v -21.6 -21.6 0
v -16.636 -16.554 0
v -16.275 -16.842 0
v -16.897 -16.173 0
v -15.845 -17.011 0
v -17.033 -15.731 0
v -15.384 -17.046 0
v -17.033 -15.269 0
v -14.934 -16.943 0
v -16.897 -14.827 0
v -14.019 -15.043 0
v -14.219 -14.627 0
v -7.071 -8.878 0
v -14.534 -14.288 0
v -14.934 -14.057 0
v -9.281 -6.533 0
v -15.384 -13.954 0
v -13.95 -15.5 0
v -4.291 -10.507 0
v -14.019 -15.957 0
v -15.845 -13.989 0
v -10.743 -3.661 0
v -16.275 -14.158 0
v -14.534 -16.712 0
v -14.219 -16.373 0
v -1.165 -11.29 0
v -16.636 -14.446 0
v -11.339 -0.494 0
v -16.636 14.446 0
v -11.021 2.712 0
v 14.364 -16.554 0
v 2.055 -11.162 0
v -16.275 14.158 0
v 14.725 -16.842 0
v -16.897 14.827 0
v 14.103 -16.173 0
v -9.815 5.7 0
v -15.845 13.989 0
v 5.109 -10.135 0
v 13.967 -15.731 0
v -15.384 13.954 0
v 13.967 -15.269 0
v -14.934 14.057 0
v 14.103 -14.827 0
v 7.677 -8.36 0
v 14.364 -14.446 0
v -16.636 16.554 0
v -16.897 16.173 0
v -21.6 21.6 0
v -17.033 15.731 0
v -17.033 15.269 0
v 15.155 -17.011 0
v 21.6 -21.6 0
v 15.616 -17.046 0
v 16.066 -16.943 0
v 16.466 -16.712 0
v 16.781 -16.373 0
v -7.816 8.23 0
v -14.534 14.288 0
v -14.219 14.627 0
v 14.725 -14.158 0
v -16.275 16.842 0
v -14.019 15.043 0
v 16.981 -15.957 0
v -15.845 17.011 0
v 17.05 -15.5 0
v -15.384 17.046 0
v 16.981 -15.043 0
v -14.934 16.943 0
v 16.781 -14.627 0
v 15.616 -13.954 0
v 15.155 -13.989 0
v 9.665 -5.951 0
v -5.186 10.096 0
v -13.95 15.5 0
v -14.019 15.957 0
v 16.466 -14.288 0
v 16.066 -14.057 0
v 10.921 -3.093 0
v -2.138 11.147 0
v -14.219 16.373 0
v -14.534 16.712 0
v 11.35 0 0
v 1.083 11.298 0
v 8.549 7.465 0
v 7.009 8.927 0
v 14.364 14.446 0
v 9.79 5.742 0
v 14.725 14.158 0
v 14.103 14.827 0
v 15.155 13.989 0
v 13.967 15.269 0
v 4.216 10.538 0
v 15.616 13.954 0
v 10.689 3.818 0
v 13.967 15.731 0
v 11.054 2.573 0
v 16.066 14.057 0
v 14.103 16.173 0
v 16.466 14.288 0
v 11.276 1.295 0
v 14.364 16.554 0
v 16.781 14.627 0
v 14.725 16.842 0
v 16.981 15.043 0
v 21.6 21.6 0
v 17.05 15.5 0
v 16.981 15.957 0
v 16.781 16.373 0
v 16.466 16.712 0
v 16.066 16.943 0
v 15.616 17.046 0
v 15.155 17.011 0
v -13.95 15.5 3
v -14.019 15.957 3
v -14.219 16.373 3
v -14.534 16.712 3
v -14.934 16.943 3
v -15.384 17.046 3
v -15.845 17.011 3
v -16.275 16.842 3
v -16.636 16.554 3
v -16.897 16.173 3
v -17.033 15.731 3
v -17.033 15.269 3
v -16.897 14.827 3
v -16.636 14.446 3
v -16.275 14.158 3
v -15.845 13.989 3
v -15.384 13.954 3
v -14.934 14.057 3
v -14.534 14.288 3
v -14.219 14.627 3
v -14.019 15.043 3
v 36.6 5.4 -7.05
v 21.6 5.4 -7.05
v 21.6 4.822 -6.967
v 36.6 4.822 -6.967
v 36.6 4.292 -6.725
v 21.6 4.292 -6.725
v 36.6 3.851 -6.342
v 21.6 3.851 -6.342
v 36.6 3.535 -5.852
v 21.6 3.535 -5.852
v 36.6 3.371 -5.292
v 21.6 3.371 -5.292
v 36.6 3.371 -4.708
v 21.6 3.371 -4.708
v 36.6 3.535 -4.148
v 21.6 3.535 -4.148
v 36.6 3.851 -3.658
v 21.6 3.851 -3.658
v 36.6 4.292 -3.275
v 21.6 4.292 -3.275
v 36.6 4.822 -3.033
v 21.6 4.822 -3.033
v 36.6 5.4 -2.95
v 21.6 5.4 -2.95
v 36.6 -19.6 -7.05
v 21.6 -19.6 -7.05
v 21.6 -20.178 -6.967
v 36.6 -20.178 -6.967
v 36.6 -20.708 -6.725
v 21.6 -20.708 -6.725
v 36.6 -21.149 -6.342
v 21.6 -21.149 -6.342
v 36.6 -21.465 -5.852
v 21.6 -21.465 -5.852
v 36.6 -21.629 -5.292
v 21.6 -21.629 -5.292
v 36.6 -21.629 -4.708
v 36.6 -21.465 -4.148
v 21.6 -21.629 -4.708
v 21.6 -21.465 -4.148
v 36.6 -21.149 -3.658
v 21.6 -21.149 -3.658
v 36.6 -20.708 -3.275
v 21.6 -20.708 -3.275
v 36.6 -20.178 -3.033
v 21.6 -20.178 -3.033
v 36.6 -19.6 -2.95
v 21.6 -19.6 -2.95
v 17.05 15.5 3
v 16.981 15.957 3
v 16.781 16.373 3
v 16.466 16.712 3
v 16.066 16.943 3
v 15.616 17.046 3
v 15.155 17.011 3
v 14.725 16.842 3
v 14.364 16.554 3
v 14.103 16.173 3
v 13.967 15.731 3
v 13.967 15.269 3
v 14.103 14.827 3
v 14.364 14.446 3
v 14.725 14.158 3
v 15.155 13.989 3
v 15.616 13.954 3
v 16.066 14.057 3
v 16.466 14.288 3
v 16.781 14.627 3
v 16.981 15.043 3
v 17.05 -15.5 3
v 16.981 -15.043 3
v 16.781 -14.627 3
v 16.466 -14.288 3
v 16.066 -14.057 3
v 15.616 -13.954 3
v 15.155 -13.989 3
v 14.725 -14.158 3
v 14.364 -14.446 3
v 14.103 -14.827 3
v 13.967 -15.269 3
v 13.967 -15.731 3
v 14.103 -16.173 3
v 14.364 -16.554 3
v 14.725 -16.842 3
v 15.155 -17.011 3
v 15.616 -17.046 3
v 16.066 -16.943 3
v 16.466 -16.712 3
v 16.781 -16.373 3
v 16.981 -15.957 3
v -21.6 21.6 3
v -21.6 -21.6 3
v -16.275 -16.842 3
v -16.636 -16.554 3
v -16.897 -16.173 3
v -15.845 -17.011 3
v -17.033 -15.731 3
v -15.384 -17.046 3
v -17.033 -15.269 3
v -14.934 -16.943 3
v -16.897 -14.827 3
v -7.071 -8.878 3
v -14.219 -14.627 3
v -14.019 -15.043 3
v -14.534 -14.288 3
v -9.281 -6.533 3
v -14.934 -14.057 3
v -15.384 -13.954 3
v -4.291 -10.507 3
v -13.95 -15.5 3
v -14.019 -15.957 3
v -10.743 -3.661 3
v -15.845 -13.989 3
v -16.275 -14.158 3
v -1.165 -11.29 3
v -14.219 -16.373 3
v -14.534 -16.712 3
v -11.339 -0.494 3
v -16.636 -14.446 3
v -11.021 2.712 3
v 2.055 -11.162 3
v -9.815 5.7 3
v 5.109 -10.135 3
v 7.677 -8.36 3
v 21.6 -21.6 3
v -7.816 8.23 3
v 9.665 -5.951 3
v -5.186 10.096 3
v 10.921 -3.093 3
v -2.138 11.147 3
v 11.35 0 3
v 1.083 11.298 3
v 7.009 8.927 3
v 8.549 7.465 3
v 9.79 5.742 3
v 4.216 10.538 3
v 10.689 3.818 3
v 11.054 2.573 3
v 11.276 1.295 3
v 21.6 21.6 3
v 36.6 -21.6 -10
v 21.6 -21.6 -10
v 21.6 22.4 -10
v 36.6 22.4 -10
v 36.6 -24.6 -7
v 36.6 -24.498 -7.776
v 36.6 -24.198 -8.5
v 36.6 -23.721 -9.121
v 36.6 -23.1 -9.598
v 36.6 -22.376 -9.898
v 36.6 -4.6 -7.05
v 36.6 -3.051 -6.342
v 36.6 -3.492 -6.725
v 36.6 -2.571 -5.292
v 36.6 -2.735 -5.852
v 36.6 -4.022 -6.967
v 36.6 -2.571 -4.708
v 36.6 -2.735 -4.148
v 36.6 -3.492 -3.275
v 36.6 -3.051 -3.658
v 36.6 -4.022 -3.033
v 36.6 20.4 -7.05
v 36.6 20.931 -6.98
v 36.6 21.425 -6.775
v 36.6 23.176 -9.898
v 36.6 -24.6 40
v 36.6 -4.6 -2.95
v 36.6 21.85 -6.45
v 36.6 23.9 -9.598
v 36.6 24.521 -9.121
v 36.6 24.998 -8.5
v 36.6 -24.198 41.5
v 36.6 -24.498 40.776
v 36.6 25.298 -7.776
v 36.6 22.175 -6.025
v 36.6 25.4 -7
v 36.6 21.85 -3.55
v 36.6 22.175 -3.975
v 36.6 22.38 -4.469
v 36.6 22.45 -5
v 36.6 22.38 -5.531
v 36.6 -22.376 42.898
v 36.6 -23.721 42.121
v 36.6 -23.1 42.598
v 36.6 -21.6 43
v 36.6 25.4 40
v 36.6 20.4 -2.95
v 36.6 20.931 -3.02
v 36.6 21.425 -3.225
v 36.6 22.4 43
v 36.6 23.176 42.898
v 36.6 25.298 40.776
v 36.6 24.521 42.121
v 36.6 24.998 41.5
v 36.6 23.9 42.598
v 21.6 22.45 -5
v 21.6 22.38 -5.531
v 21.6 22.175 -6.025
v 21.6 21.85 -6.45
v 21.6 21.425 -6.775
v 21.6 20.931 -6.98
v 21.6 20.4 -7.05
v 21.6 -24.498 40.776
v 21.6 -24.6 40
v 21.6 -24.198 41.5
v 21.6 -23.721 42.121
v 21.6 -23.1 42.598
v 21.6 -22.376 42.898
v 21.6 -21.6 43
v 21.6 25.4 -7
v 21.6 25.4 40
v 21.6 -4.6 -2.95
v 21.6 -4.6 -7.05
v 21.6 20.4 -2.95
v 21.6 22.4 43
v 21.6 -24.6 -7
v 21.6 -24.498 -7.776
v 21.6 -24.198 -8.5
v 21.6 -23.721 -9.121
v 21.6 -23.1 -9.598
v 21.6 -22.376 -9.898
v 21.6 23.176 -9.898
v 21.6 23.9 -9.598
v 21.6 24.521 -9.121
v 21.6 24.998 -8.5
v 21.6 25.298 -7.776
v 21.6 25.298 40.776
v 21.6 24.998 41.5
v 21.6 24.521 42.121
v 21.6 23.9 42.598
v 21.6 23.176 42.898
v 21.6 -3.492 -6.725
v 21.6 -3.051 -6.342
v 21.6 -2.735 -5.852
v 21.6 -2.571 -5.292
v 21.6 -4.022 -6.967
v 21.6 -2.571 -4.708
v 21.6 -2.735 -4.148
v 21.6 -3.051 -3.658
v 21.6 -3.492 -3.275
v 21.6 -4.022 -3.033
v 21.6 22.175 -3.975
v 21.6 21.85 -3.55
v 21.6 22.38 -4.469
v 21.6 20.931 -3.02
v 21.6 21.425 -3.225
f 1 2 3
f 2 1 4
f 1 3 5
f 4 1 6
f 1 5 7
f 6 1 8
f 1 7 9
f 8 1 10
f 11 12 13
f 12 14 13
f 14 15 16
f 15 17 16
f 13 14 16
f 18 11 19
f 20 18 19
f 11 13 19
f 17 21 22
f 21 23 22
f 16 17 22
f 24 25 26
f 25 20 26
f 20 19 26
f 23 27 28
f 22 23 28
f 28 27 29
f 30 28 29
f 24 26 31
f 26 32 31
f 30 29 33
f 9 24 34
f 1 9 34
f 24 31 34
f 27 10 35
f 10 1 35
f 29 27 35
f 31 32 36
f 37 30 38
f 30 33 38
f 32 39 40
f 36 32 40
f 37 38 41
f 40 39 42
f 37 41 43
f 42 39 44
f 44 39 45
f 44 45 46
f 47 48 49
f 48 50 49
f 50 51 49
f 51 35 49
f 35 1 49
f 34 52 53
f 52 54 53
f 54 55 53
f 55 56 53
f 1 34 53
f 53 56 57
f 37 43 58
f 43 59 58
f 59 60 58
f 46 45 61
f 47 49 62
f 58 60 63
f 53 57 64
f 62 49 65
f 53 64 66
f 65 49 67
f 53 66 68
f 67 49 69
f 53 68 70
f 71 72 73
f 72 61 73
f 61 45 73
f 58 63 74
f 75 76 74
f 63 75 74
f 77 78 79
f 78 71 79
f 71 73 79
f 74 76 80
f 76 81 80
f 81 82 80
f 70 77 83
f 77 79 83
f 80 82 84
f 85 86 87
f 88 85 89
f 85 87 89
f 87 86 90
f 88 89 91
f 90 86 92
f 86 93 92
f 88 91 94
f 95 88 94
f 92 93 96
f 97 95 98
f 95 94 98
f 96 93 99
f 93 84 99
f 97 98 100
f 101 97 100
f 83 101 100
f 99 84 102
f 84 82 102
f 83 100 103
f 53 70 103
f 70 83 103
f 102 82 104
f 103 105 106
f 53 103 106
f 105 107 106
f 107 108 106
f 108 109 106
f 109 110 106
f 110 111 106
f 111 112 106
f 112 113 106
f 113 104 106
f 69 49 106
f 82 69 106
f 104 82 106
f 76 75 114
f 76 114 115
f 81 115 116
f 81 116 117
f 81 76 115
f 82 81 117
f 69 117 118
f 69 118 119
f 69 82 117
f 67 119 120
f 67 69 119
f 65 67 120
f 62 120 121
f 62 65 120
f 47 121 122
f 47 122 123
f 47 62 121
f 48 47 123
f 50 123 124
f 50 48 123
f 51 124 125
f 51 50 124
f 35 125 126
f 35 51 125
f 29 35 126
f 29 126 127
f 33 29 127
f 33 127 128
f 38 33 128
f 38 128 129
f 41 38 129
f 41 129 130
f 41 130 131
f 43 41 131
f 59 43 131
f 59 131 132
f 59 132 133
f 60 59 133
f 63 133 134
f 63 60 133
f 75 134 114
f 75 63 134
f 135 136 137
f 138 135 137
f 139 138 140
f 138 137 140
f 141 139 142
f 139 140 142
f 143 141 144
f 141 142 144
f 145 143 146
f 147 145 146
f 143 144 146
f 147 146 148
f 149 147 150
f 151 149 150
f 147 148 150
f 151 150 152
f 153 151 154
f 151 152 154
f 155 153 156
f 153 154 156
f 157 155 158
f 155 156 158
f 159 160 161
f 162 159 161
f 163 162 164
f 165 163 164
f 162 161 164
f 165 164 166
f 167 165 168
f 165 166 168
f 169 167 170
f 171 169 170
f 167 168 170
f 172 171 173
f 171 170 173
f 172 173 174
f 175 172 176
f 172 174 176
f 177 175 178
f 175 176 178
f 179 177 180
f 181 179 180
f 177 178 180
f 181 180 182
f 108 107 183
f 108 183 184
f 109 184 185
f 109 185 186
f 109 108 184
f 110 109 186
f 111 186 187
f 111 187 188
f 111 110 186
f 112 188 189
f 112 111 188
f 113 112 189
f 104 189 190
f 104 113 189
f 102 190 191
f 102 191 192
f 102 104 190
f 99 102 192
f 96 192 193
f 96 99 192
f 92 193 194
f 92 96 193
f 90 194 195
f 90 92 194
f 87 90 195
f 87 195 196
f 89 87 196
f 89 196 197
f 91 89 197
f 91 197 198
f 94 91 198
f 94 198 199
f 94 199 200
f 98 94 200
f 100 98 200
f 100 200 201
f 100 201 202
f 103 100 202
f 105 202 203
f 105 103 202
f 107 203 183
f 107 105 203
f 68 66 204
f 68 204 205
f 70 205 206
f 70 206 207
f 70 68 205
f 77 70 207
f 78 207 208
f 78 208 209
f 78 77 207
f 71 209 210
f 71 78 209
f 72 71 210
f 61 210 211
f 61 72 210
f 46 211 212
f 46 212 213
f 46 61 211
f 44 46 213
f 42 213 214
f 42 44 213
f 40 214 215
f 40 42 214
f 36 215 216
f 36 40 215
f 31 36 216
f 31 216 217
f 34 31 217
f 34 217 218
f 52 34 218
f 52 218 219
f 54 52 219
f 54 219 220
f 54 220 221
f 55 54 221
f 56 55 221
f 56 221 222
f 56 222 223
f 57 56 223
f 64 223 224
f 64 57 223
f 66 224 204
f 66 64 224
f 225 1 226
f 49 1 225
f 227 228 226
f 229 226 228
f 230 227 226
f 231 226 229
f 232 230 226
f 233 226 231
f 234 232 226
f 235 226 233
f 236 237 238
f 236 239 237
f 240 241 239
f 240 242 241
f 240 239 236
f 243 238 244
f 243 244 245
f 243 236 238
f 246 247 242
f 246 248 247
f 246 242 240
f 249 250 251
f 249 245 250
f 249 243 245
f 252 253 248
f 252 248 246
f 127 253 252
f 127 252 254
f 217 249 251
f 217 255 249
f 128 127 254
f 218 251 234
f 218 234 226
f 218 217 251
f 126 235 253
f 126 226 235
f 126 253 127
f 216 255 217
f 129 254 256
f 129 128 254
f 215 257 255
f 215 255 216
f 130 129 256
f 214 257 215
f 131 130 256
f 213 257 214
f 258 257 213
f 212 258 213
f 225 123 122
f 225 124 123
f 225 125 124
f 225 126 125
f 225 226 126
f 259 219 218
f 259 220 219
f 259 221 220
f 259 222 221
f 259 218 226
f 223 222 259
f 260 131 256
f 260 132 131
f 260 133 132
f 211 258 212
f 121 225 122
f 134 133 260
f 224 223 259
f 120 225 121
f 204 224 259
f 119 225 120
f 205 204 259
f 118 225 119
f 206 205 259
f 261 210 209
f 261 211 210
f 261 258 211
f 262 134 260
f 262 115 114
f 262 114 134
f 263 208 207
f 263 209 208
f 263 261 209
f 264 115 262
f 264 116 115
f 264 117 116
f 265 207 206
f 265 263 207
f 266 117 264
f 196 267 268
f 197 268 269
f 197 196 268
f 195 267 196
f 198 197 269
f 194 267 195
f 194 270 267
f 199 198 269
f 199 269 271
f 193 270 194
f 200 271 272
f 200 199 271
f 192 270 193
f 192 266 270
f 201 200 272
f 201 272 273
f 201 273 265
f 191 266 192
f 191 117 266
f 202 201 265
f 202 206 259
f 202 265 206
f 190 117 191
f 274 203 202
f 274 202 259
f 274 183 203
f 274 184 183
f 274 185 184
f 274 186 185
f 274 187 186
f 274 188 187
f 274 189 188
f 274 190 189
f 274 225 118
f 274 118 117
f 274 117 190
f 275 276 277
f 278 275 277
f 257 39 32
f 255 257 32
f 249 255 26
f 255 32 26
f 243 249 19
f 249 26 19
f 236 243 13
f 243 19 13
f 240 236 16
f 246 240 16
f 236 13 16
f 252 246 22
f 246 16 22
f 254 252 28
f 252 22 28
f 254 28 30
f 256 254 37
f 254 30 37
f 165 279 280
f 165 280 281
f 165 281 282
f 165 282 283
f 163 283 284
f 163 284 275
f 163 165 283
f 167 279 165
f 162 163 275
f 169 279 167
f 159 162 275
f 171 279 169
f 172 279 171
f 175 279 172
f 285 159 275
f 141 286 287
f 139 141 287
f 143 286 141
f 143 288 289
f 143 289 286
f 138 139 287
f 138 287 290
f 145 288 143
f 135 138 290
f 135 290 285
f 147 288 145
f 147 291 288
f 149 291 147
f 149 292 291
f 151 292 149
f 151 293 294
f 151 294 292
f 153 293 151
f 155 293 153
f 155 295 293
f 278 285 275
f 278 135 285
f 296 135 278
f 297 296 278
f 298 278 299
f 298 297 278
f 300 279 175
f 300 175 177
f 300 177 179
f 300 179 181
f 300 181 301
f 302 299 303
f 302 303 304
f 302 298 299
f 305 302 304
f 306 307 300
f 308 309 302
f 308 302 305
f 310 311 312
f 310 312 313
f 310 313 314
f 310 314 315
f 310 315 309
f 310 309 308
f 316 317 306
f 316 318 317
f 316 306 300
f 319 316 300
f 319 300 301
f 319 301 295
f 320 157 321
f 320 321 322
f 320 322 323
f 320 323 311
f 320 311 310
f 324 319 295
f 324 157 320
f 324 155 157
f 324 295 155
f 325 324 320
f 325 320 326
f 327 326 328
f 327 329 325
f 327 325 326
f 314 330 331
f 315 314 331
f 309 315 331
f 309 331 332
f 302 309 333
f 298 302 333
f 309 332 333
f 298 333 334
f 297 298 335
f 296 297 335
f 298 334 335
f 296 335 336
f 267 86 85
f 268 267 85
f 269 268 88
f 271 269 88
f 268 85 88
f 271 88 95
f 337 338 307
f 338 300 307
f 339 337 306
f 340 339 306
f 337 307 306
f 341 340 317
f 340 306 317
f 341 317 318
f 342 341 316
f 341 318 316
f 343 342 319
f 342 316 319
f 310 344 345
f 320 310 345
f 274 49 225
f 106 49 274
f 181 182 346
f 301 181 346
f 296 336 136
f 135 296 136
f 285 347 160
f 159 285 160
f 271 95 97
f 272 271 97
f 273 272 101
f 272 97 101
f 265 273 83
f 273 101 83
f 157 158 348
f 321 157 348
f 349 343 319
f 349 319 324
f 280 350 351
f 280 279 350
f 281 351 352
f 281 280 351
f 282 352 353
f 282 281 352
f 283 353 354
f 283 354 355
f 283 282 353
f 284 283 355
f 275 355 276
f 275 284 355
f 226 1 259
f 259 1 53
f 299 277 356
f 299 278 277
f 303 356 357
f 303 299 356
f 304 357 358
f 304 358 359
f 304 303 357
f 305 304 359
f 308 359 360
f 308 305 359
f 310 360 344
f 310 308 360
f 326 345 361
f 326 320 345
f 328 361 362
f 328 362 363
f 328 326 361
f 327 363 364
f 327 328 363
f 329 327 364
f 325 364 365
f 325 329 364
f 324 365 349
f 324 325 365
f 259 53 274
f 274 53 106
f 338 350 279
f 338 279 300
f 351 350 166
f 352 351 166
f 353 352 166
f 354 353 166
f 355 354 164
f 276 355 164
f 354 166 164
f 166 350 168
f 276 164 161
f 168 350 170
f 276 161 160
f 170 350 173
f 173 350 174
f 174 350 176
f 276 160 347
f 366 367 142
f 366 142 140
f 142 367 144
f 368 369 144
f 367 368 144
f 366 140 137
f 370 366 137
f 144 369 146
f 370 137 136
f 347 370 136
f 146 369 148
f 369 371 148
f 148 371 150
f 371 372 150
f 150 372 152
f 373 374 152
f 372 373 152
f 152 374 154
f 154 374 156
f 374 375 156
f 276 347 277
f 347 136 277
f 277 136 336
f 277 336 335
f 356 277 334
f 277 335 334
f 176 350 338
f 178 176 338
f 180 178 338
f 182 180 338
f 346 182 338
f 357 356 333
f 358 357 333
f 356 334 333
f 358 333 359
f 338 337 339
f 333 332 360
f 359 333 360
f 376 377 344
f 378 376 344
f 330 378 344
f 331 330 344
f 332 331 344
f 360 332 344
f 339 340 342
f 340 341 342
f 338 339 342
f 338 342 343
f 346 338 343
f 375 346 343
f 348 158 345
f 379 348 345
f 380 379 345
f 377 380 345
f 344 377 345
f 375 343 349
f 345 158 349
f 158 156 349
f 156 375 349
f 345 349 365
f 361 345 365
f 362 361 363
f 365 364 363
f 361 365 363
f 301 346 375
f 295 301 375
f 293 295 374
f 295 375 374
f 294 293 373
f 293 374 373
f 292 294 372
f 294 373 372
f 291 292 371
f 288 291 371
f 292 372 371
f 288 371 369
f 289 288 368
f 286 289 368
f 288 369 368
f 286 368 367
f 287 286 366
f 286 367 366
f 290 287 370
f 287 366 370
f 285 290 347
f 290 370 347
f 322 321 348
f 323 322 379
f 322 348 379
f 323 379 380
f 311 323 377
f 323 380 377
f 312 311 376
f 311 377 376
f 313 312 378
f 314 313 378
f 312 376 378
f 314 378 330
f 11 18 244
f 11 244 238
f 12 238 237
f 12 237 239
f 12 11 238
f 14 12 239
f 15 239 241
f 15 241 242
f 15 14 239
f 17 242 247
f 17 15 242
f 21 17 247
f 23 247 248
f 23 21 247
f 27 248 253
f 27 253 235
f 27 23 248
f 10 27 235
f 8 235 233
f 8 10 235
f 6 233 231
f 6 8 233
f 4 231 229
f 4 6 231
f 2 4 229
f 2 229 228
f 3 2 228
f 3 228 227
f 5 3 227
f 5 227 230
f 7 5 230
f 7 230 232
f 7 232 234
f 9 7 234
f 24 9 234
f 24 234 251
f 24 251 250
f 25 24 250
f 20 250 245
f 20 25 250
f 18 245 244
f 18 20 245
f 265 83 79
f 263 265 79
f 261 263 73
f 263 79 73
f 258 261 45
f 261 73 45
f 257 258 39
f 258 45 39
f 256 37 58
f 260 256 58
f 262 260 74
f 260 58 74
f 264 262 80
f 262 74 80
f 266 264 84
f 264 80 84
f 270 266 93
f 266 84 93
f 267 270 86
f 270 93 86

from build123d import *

# Parameters (mm, degrees)
F0_W     = 43.2
F0_H     = 43.2
F0_R     = 1.55
F1_DEPTH = 3
F2_W     = 50
F2_H     = 53
F2_R     = 2.3311267536
F3_DEPTH = 15
F4_R     = 3


with BuildPart() as f1:
    # F0 (on Top) → F1 (new body)
    with BuildSketch(Plane.XY):
        Rectangle(F0_W, F0_H)
        with Locations((-15.5, -15.5)):
            Circle(F0_R, mode=Mode.SUBTRACT)
        with Locations((15.5, -15.5)):
            Circle(F0_R, mode=Mode.SUBTRACT)
        with Locations((-15.5, 15.5)):
            Circle(F0_R, mode=Mode.SUBTRACT)
        with BuildLine():
            ThreePointArc((10.6885137593, 3.8181374539), (11.1834058133, 1.9375072686), (11.35, 0))
            ThreePointArc((11.35, 0), (9.6645780725, -5.951338562), (5.1088668406, -10.135185228))
            ThreePointArc((5.1088668406, -10.135185228), (-8.2600200355, -7.7842513457), (-9.8146512505, 5.7004491779))
            ThreePointArc((-9.8146512505, 5.7004491779), (-2.1377646428, 11.1468588549), (7.0093744434, 8.9269910895))
            ThreePointArc((7.0093744434, 8.9269910895), (9.2102610211, 6.6327665362), (10.6885137593, 3.8181374539))
        make_face(mode=Mode.SUBTRACT)
        with Locations((15.5, 15.5)):
            Circle(F0_R, mode=Mode.SUBTRACT)
    extrude(amount=F1_DEPTH)


with BuildPart() as f3:
    # F2 (on face) → F3 (new body)
    with BuildSketch(Plane.YZ.offset(21.6)):
        with Locations((0.4, 16.5)):
            Rectangle(F2_W, F2_H)
        Circle(F2_R, mode=Mode.SUBTRACT)
        with BuildLine():
            ThreePointArc((-19.6, -7.05), (-21.65, -5), (-19.6, -2.95))
            Line((-19.6, -2.95), (-4.6, -2.95))
            Line((-4.6, -2.95), (5.4, -2.95))
            Line((5.4, -2.95), (20.4, -2.95))
            ThreePointArc((20.4, -2.95), (21.8495689014, -3.5504310986), (22.45, -5))
            ThreePointArc((22.45, -5), (21.8495689014, -6.4495689014), (20.4, -7.05))
            Line((20.4, -7.05), (5.4, -7.05))
            Line((5.4, -7.05), (-4.6, -7.05))
            Line((-4.6, -7.05), (-19.6, -7.05))
        make_face(mode=Mode.SUBTRACT)
        with BuildLine():
            Line((5.4, -2.95), (-4.6, -2.95))
            ThreePointArc((-4.6, -2.95), (-2.55, -5), (-4.6, -7.05))
            Line((-4.6, -7.05), (5.4, -7.05))
            ThreePointArc((5.4, -7.05), (3.35, -5), (5.4, -2.95))
        make_face()
        with BuildLine():
            ThreePointArc((-2.3311267536, 0), (0, -2.3311267536), (2.3311267536, 0))
            Line((2.3311267536, 0), (-2.3311267536, 0))
        make_face()
        with BuildLine():
            Line((-2.3311267536, 0), (2.3311267536, 0))
            ThreePointArc((2.3311267536, 0), (0, 2.3311267536), (-2.3311267536, 0))
        make_face()
    extrude(amount=F3_DEPTH)

    # F4
    f4_edges = [f3.edges().sort_by_distance(p)[0] for p in [
        (29.1, 25.4, -10),
        (29.1, -24.6, -10),
        (29.1, 25.4, 43),
        (29.1, -24.6, 43),
    ]]
    fillet(f4_edges, radius=F4_R)


solid = Compound([f1.part, f3.part])
